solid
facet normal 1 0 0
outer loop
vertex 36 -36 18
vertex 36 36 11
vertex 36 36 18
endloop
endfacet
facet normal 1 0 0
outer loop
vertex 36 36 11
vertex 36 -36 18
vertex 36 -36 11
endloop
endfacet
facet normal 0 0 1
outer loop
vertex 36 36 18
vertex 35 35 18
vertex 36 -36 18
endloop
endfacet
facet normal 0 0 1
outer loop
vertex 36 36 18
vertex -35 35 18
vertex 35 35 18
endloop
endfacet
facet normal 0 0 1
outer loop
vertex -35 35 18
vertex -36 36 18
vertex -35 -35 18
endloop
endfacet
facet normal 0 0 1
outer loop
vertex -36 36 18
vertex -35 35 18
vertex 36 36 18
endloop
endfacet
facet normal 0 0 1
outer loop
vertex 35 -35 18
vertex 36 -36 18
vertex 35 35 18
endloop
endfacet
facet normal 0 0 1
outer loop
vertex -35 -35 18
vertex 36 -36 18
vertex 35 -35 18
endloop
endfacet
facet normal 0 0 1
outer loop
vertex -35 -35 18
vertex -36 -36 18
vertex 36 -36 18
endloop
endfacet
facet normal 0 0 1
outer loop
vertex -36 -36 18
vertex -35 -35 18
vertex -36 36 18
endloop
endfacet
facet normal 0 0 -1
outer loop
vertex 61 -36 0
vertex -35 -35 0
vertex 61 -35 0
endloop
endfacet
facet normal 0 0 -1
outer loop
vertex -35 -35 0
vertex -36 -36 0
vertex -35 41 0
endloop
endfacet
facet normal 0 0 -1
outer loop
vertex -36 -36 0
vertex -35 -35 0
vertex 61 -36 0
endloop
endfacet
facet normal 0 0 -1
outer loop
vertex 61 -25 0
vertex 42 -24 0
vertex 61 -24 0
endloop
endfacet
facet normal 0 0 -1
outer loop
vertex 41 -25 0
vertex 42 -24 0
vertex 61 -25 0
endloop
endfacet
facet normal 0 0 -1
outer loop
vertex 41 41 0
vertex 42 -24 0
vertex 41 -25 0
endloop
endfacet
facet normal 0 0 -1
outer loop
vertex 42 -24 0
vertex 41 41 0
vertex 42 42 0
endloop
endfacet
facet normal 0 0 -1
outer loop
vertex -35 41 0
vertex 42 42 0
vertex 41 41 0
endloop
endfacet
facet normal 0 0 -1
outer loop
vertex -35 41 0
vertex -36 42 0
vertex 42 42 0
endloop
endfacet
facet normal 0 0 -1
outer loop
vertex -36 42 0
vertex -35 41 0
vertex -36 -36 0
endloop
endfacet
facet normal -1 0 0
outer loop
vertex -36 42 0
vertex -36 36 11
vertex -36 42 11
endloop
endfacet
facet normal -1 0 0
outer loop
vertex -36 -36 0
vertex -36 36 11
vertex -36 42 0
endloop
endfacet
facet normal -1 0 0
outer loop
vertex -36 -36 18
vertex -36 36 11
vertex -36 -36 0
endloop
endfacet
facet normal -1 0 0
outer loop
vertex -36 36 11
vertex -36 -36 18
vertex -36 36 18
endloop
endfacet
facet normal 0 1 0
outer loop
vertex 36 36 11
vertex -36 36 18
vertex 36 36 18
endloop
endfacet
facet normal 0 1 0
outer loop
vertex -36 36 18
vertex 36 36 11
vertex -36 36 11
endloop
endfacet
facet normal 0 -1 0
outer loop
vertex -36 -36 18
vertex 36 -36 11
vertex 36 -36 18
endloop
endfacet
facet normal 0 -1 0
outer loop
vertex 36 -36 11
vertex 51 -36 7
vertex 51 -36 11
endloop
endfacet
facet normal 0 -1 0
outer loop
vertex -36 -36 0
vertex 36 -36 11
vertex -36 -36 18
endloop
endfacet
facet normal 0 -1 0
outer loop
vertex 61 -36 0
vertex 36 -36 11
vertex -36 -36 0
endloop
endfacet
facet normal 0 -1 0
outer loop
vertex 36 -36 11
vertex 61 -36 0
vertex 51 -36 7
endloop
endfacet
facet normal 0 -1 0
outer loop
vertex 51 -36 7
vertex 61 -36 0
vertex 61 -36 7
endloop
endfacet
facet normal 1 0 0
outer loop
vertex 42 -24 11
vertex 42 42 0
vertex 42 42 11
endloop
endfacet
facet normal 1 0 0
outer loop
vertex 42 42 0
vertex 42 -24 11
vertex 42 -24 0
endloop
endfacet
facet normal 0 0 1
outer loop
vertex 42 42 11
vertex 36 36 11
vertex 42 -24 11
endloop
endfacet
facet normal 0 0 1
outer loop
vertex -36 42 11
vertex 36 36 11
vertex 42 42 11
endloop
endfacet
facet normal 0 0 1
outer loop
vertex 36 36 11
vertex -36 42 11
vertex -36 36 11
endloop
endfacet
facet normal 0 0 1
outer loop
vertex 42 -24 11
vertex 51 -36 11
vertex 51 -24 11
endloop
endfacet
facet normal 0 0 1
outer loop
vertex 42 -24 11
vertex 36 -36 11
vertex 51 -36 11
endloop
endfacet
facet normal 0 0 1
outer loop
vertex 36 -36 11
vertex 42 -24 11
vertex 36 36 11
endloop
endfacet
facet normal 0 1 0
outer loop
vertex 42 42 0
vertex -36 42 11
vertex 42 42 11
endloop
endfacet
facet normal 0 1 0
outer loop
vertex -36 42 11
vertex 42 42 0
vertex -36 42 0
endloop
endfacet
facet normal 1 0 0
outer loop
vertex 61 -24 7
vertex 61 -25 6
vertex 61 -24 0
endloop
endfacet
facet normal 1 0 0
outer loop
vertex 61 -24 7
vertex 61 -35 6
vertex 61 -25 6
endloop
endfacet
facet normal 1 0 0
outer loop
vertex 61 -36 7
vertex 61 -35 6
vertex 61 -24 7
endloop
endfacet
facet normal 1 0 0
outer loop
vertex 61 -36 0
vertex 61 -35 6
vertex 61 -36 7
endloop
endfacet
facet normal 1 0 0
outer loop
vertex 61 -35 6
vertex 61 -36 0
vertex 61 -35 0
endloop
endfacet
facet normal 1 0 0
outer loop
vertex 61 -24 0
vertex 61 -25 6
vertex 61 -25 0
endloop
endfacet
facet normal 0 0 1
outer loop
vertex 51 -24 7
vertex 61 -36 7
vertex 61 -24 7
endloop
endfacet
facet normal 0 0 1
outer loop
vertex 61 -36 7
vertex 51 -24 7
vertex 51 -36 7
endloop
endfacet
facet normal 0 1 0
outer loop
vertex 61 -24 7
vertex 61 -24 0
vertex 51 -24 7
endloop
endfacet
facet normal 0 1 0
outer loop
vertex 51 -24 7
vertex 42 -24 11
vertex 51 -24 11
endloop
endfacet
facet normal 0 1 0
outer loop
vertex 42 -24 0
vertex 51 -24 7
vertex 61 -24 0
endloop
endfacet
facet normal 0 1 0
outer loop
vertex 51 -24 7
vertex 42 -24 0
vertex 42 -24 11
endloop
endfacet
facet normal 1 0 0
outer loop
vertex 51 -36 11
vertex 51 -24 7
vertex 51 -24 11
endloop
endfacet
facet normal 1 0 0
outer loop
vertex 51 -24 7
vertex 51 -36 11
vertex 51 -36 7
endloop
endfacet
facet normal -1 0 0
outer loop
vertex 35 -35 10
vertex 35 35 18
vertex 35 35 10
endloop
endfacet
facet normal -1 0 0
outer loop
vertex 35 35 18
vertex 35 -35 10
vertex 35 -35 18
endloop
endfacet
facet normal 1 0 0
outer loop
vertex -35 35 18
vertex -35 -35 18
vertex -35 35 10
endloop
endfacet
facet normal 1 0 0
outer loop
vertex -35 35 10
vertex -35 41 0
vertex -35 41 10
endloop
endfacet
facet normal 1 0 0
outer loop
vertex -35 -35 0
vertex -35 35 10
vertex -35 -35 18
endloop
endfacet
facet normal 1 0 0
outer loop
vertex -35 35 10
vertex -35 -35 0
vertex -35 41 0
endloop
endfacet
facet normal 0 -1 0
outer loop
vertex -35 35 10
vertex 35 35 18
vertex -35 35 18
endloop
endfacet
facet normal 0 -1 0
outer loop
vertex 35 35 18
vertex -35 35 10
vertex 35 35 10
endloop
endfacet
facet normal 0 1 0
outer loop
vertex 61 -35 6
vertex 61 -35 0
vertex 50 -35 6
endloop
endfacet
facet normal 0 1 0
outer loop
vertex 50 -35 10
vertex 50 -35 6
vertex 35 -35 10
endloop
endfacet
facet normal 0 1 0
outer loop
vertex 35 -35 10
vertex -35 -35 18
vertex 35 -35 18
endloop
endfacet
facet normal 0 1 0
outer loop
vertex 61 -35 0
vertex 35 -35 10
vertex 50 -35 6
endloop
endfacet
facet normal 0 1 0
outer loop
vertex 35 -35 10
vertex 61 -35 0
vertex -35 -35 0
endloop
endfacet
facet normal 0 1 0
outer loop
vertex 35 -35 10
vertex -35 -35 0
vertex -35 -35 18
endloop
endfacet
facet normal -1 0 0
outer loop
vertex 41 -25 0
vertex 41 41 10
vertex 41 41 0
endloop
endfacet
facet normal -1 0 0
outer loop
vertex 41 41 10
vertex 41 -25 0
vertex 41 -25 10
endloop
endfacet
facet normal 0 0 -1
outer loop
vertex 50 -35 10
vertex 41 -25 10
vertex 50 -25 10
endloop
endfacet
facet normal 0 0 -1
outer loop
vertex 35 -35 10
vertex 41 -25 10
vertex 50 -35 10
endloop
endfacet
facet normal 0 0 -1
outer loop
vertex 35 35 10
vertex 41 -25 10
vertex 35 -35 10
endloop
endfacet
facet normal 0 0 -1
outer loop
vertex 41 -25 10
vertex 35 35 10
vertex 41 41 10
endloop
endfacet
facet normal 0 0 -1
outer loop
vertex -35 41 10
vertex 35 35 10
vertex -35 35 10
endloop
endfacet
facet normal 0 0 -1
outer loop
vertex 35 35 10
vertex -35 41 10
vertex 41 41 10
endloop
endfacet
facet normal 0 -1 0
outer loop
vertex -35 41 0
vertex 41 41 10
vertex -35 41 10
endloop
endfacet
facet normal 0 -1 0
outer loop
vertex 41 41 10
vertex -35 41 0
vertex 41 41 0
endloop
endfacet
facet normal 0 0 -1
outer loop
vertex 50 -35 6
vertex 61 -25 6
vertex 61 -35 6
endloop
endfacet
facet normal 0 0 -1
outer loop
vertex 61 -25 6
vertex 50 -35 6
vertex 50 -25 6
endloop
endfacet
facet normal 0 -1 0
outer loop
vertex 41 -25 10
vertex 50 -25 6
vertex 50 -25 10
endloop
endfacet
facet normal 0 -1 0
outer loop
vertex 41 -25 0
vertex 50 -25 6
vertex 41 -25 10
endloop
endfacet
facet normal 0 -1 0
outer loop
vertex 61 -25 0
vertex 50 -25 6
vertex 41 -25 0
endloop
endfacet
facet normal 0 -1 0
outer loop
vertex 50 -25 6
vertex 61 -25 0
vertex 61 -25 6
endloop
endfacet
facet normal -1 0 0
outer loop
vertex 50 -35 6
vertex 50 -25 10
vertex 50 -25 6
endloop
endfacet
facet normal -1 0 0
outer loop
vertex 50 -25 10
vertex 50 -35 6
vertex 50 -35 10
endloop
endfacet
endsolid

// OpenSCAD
b=70;//68-70

cable_w=10;//8;
cable_h=6;//4;

thick = 1;

height = 18;

difference(){
    outer_all();
    inner_all();
}
 


module outer_all(){
    union(){
        switch_outer();
        cable_top_outer();
        cable_right_outer();
        cable_right_bottom_outer();
        cable_right_bottom_outer_2();
    }
}

module inner_all(){
    union(){
        switch_inner();
        cable_top_inner();
        cable_right_inner();
        cable_right_bottom_inner();
        cable_right_bottom_inner_2();
    }
}

add=20;


module cable_right_bottom_outer_2(){
    // translate([b/2 + add/2  + cable_h, -b/2 + cable_h/2  +thick/2  ,cable_h/2+thick/2])
    translate([b/2 + cable_w/2  + cable_h, -b/2 + (cable_w + thick*2)/2 - thick ,cable_w/2+thick/2])
    cube([cable_w, cable_w + thick*2 ,cable_w+thick],center=true);
}


module cable_right_bottom_inner_2(){
    // translate([b/2 + add/2  + cable_h, -b/2 + cable_h/2  +thick/2  ,cable_h/2])
    translate([b/2 + cable_w/2  + cable_h-thick, -b/2 + (cable_w + thick*2)/2 - thick  ,cable_w/2])
    cube([cable_w,cable_w,cable_w],center=true);
}



module cable_right_bottom_outer(){
    // translate([b/2 + add/2  + cable_h, -b/2 + cable_h/2  +thick/2  ,cable_h/2+thick/2])
    translate([b/2 + add/2  + cable_h, -b/2 + (cable_w + thick*2)/2 - thick ,cable_h/2+thick/2])
    cube([add, cable_w + thick*2 ,cable_h+thick],center=true);
}


module cable_right_bottom_inner(){
    // translate([b/2 + add/2  + cable_h, -b/2 + cable_h/2  +thick/2  ,cable_h/2])
    translate([b/2 + add/2  + cable_h, -b/2 + (cable_w + thick*2)/2 - thick  ,cable_h/2])
    cube([add,cable_w,cable_h],center=true);
}



module cable_right_outer(){
    translate([b/2+cable_h/2 + thick/2, cable_h/2,  cable_w/2 + thick/2])
    cube([cable_h+thick, b + cable_h + thick*2 ,cable_w + thick],center=true);
}


module cable_right_inner(){
    translate([b/2+cable_h/2, cable_h/2 ,cable_w/2])
    cube([cable_h, b + cable_h ,cable_w],center=true);
}


module cable_top_outer(){
    translate([cable_h/2, b/2+cable_h/2 + thick/2, cable_w/2 + thick/2])
    cube([b + cable_h + thick*2,cable_h+thick,cable_w + thick],center=true);
}


module cable_top_inner(){
    translate([cable_h/2,b/2+cable_h/2,cable_w/2])
    cube([b + cable_h,cable_h,cable_w],center=true);
}

module outer_wall(){
    difference(){
        switch_outer();
        switch_inner();
    }
}

module switch_outer(){
    translate([0,0,height/2])
    cube([b+thick*2,b+thick*2,height],center=true);
}

module switch_inner(){
    translate([0,0,height/2])
    cube([b,b,height],center=true);
}
